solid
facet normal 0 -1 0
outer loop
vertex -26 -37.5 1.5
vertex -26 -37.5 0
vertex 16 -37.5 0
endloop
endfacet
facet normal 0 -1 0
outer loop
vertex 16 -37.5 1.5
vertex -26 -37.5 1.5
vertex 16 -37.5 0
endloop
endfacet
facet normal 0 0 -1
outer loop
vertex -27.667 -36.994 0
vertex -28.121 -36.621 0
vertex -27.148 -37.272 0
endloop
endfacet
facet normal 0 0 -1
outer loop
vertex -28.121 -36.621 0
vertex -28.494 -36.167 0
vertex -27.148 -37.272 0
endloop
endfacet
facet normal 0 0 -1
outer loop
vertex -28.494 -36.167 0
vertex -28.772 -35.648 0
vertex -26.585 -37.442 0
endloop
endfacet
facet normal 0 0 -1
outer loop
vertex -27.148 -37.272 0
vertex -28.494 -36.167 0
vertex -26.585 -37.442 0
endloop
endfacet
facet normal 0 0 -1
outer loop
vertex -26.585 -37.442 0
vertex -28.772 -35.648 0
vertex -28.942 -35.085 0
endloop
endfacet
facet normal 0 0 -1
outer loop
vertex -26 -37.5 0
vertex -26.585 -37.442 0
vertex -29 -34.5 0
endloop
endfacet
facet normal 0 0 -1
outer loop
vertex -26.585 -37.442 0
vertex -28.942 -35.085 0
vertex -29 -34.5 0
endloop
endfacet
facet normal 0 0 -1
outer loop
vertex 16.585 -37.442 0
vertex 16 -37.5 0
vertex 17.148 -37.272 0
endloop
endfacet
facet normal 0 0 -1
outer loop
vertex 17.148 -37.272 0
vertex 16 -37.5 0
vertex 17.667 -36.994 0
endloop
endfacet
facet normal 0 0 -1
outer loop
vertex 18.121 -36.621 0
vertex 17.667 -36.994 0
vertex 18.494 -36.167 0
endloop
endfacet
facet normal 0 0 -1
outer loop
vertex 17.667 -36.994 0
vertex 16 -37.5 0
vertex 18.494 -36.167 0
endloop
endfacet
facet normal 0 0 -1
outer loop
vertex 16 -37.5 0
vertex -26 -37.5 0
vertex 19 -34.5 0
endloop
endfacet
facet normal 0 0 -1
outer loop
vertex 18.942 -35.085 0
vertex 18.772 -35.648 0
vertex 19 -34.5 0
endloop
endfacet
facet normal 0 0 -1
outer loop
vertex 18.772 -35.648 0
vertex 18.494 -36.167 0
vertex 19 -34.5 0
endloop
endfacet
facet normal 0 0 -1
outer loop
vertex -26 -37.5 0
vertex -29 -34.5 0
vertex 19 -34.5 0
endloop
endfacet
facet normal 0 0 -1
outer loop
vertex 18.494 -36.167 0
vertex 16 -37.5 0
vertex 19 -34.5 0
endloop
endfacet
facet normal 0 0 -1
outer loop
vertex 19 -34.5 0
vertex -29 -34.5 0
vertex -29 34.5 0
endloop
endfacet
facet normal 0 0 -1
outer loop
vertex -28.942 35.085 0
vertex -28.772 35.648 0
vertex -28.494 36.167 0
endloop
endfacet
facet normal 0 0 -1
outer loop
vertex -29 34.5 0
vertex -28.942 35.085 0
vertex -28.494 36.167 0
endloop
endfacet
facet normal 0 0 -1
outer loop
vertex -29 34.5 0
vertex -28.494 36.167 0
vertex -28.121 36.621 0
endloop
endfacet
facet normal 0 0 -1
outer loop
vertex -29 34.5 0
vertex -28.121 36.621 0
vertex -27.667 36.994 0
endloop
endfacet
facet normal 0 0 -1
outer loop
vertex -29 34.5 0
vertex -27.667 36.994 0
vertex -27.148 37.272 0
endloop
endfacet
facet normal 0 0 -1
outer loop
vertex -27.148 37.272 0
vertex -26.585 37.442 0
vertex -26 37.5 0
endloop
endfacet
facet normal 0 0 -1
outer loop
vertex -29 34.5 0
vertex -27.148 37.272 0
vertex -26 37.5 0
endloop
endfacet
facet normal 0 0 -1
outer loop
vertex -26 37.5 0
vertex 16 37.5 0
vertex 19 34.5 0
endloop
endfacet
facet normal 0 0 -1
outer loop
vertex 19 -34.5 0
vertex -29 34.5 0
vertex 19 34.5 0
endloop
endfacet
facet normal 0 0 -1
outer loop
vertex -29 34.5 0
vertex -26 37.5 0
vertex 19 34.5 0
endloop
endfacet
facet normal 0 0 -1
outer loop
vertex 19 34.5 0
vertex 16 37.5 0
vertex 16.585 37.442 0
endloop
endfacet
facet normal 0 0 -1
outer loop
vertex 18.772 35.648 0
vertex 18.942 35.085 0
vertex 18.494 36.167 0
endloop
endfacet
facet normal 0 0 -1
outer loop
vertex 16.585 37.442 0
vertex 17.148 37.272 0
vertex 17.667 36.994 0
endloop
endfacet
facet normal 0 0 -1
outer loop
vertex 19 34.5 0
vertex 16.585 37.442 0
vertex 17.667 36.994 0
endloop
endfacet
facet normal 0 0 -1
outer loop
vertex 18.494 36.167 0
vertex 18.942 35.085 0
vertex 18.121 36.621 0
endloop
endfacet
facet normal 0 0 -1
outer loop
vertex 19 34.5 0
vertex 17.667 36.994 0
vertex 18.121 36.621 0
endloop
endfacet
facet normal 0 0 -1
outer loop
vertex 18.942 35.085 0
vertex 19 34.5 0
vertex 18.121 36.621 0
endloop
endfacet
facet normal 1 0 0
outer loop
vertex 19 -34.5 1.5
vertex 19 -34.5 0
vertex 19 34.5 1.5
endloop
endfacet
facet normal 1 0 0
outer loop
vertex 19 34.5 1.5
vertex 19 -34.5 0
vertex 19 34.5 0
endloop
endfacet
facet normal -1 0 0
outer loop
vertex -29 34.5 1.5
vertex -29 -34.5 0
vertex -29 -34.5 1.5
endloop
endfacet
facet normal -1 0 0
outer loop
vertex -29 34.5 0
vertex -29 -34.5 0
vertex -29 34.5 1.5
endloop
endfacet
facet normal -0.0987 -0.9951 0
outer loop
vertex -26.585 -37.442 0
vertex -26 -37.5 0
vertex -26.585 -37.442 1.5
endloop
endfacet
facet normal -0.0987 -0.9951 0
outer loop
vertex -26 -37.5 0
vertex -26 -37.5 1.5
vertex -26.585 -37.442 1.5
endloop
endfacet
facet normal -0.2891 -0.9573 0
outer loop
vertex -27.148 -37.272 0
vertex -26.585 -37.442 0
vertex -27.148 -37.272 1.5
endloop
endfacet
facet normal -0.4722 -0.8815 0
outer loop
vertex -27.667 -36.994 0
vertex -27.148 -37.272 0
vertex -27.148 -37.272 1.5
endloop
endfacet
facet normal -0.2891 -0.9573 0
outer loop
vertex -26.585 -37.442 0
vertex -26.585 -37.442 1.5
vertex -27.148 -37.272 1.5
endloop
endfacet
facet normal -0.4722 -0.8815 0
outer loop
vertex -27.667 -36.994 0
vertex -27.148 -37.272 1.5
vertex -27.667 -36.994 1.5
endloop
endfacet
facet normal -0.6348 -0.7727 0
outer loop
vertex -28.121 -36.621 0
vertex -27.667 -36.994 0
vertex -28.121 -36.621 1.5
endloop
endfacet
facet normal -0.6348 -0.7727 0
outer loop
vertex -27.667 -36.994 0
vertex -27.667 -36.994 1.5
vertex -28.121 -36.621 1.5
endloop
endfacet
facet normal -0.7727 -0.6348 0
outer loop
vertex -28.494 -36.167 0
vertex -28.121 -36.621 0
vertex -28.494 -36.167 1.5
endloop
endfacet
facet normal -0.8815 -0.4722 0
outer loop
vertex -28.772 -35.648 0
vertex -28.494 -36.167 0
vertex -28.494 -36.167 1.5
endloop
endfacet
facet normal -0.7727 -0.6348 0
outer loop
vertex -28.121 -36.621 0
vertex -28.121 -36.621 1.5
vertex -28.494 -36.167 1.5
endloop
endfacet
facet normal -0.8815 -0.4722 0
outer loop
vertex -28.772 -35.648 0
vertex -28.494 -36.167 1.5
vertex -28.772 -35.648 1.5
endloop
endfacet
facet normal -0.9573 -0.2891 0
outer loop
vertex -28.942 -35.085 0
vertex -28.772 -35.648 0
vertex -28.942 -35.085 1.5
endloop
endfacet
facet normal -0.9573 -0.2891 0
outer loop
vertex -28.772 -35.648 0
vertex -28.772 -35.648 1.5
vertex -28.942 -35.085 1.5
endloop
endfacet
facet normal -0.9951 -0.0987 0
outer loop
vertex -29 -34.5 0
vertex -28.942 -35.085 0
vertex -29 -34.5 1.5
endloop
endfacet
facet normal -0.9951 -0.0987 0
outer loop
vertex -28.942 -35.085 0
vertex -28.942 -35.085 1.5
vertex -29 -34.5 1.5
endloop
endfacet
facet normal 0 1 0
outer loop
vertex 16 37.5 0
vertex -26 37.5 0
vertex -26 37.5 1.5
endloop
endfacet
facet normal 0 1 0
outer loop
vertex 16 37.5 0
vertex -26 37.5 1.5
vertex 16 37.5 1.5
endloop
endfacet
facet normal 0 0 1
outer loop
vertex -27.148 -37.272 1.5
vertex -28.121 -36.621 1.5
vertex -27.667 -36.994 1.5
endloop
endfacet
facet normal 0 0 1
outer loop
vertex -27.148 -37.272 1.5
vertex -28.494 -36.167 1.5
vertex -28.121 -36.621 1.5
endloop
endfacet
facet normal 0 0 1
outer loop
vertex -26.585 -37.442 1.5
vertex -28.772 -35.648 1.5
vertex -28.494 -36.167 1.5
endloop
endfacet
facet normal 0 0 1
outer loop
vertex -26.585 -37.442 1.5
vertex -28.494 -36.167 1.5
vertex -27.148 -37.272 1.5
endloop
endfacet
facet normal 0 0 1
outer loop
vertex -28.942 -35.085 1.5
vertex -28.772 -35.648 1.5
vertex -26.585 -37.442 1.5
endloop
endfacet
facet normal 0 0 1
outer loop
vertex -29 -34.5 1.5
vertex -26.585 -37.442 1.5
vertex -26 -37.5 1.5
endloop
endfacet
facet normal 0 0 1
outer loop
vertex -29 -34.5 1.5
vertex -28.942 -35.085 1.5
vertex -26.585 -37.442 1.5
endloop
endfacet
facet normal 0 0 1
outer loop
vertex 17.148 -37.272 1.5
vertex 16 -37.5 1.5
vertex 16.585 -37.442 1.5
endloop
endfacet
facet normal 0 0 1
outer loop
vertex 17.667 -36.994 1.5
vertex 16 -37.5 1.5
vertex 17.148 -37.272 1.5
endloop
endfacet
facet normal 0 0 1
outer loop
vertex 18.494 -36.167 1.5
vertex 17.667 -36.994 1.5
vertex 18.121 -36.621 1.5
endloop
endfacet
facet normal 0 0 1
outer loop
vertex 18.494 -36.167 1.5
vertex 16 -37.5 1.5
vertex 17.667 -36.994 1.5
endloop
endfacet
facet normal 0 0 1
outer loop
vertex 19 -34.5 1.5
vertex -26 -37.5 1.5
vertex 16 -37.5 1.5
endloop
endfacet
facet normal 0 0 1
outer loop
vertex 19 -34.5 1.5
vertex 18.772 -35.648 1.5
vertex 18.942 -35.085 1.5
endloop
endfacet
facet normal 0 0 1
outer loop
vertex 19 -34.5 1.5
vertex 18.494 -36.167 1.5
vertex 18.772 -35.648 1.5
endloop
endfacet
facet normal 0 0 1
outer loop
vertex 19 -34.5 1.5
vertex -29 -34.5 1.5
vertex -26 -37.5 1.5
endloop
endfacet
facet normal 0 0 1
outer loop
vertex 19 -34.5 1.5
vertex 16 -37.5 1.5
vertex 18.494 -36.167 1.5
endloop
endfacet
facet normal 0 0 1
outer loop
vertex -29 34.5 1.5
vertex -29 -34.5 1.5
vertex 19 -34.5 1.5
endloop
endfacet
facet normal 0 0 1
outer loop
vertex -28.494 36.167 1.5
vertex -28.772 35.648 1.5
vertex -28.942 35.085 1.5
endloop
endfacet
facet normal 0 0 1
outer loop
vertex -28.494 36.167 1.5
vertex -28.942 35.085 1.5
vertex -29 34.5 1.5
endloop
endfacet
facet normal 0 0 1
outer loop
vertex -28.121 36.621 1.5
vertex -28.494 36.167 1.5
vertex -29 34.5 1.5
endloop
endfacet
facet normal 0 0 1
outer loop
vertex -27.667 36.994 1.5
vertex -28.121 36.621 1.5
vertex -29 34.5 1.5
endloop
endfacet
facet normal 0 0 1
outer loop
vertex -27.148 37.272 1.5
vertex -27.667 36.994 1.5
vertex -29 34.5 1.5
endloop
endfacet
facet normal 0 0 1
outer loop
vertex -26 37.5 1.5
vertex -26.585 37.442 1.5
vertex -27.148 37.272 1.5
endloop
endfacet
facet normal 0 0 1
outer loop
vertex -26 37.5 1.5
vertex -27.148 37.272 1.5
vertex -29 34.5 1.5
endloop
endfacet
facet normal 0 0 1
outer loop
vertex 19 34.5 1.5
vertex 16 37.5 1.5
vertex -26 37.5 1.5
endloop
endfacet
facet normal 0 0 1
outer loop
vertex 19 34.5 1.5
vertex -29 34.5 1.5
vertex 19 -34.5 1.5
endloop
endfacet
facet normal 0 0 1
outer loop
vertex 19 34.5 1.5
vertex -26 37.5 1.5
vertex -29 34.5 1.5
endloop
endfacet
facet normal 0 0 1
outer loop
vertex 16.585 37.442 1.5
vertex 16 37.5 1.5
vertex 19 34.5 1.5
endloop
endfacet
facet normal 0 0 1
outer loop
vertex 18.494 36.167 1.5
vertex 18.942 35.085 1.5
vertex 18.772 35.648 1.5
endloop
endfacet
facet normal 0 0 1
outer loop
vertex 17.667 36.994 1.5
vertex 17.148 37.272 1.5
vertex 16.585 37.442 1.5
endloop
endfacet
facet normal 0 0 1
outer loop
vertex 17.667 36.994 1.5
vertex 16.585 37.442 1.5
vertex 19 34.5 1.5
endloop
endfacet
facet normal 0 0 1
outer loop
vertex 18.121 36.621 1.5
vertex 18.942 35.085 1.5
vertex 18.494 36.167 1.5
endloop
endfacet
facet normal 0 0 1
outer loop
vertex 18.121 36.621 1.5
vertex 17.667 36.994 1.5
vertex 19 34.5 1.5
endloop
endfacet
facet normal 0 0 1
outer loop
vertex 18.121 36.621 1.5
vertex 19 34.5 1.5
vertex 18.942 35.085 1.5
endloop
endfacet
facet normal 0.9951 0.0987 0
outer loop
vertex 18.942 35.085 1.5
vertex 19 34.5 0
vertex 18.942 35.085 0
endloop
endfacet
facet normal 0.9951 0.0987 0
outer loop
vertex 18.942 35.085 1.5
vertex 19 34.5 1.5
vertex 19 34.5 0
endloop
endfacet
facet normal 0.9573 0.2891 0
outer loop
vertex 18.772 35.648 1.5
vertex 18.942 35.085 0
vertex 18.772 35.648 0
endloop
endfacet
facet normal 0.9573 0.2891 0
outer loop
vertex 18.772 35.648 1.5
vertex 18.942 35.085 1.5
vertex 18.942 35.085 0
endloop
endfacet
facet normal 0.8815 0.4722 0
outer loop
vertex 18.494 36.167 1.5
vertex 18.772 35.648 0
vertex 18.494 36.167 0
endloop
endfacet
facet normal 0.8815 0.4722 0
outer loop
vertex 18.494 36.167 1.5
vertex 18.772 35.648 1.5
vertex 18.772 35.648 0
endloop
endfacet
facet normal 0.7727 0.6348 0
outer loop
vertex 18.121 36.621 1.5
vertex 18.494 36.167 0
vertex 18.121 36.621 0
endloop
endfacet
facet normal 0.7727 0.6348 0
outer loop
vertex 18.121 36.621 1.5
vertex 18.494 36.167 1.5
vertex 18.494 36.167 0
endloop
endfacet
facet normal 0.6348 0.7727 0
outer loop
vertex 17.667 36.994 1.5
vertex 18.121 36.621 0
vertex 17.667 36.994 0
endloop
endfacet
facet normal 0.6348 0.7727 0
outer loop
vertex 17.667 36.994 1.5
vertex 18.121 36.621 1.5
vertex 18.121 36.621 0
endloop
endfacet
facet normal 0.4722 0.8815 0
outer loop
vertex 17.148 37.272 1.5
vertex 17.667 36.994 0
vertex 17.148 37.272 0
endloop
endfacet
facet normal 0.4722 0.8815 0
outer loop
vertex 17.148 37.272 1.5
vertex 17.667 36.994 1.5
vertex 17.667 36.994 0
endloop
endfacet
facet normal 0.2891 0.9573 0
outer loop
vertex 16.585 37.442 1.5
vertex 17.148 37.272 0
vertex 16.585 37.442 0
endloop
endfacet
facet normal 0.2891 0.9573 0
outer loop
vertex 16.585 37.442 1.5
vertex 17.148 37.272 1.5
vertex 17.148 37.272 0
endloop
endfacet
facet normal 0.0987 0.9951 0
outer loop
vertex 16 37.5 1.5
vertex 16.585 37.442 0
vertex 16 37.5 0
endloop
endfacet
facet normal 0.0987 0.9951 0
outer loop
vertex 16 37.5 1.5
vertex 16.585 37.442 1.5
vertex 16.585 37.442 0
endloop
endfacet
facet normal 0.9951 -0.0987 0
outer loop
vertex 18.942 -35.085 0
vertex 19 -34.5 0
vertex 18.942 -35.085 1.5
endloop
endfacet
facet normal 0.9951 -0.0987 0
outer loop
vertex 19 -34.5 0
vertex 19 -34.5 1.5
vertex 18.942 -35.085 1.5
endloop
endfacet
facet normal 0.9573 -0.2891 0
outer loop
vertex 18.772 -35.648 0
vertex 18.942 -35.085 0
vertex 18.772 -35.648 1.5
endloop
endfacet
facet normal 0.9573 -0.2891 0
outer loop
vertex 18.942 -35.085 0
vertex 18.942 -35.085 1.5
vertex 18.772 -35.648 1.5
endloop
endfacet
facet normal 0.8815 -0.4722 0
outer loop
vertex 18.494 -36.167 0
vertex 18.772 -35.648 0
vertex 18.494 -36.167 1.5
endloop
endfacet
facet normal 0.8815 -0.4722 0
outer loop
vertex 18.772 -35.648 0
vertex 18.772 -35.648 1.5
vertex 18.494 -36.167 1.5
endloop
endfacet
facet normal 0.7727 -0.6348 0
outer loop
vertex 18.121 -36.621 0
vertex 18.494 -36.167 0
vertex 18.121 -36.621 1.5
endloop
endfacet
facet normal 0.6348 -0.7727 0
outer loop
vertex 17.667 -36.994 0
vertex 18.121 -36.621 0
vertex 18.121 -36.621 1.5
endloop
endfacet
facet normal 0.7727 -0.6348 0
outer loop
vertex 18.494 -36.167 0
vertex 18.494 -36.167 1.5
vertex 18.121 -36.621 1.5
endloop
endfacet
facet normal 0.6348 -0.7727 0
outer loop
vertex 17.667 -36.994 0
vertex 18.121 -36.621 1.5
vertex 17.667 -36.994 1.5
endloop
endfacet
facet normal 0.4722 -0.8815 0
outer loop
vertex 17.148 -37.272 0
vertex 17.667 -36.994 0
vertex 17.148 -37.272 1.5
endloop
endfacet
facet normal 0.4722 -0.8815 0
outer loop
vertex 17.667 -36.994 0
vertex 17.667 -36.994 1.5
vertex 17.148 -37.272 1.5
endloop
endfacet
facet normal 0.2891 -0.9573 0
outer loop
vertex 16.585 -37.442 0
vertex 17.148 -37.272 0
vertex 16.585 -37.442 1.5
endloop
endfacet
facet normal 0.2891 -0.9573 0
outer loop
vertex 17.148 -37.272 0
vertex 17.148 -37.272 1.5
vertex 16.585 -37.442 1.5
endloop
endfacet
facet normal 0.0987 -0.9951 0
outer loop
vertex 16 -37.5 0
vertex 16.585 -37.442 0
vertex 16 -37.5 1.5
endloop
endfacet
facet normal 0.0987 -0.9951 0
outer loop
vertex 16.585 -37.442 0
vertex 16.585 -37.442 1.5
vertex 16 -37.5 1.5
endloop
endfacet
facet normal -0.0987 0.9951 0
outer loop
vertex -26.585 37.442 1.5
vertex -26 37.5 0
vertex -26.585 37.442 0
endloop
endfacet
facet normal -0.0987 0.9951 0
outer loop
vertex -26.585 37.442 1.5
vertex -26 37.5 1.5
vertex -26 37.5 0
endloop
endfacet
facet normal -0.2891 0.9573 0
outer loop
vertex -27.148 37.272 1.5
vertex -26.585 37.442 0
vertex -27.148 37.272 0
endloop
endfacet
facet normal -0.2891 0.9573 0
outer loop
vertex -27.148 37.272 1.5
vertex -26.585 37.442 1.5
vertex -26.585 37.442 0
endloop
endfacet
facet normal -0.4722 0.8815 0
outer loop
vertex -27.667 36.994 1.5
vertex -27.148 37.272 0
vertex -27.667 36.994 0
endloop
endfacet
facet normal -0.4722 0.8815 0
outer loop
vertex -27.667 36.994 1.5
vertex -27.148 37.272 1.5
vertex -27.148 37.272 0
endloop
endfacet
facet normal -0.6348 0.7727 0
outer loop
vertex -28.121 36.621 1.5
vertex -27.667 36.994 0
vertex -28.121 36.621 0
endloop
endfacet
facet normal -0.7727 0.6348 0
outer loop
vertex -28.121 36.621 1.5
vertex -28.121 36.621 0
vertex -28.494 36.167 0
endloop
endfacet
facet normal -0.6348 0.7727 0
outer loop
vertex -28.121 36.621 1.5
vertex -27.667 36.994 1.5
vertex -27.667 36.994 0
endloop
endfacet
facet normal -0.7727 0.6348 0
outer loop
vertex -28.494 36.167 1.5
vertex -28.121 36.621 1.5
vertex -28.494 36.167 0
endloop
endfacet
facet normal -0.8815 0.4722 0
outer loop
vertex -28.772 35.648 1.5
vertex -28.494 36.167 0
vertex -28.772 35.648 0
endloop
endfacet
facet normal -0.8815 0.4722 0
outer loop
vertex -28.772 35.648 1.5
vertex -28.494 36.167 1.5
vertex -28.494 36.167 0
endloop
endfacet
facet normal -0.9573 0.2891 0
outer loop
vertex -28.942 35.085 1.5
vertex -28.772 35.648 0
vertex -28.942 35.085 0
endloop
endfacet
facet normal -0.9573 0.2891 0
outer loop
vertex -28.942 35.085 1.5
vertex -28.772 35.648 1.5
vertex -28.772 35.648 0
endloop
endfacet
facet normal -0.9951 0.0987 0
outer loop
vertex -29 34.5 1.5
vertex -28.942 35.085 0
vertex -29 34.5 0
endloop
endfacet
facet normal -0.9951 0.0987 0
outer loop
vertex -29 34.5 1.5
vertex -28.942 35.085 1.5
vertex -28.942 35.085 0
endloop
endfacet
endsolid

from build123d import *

# Parameters (mm, degrees)
SKETCH_W    = 48
SKETCH_H    = 75
PAD_DEPTH   = 1.5
FILLET010_R = 3
FILLET011_R = 3
FILLET012_R = 3
FILLET013_R = 3


with BuildPart() as part:
    # Sketch → Pad (new body)
    with BuildSketch(Plane.XY):
        with Locations((-5, 0)):
            Rectangle(SKETCH_W, SKETCH_H)
    extrude(amount=PAD_DEPTH)

    # Fillet010
    fillet010_edges = [part.edges().sort_by_distance(p)[0] for p in [
        (19, 37.5, 0.75),
    ]]
    fillet(fillet010_edges, radius=FILLET010_R)

    # Fillet011
    fillet011_edges = [part.edges().sort_by_distance(p)[0] for p in [
        (-29, 37.5, 0.75),
    ]]
    fillet(fillet011_edges, radius=FILLET011_R)

    # Fillet012
    fillet012_edges = [part.edges().sort_by_distance(p)[0] for p in [
        (19, -37.5, 0.75),
    ]]
    fillet(fillet012_edges, radius=FILLET012_R)

    # Fillet013
    fillet013_edges = [part.edges().sort_by_distance(p)[0] for p in [
        (-29, -37.5, 0.75),
    ]]
    fillet(fillet013_edges, radius=FILLET013_R)


solid = part.part
